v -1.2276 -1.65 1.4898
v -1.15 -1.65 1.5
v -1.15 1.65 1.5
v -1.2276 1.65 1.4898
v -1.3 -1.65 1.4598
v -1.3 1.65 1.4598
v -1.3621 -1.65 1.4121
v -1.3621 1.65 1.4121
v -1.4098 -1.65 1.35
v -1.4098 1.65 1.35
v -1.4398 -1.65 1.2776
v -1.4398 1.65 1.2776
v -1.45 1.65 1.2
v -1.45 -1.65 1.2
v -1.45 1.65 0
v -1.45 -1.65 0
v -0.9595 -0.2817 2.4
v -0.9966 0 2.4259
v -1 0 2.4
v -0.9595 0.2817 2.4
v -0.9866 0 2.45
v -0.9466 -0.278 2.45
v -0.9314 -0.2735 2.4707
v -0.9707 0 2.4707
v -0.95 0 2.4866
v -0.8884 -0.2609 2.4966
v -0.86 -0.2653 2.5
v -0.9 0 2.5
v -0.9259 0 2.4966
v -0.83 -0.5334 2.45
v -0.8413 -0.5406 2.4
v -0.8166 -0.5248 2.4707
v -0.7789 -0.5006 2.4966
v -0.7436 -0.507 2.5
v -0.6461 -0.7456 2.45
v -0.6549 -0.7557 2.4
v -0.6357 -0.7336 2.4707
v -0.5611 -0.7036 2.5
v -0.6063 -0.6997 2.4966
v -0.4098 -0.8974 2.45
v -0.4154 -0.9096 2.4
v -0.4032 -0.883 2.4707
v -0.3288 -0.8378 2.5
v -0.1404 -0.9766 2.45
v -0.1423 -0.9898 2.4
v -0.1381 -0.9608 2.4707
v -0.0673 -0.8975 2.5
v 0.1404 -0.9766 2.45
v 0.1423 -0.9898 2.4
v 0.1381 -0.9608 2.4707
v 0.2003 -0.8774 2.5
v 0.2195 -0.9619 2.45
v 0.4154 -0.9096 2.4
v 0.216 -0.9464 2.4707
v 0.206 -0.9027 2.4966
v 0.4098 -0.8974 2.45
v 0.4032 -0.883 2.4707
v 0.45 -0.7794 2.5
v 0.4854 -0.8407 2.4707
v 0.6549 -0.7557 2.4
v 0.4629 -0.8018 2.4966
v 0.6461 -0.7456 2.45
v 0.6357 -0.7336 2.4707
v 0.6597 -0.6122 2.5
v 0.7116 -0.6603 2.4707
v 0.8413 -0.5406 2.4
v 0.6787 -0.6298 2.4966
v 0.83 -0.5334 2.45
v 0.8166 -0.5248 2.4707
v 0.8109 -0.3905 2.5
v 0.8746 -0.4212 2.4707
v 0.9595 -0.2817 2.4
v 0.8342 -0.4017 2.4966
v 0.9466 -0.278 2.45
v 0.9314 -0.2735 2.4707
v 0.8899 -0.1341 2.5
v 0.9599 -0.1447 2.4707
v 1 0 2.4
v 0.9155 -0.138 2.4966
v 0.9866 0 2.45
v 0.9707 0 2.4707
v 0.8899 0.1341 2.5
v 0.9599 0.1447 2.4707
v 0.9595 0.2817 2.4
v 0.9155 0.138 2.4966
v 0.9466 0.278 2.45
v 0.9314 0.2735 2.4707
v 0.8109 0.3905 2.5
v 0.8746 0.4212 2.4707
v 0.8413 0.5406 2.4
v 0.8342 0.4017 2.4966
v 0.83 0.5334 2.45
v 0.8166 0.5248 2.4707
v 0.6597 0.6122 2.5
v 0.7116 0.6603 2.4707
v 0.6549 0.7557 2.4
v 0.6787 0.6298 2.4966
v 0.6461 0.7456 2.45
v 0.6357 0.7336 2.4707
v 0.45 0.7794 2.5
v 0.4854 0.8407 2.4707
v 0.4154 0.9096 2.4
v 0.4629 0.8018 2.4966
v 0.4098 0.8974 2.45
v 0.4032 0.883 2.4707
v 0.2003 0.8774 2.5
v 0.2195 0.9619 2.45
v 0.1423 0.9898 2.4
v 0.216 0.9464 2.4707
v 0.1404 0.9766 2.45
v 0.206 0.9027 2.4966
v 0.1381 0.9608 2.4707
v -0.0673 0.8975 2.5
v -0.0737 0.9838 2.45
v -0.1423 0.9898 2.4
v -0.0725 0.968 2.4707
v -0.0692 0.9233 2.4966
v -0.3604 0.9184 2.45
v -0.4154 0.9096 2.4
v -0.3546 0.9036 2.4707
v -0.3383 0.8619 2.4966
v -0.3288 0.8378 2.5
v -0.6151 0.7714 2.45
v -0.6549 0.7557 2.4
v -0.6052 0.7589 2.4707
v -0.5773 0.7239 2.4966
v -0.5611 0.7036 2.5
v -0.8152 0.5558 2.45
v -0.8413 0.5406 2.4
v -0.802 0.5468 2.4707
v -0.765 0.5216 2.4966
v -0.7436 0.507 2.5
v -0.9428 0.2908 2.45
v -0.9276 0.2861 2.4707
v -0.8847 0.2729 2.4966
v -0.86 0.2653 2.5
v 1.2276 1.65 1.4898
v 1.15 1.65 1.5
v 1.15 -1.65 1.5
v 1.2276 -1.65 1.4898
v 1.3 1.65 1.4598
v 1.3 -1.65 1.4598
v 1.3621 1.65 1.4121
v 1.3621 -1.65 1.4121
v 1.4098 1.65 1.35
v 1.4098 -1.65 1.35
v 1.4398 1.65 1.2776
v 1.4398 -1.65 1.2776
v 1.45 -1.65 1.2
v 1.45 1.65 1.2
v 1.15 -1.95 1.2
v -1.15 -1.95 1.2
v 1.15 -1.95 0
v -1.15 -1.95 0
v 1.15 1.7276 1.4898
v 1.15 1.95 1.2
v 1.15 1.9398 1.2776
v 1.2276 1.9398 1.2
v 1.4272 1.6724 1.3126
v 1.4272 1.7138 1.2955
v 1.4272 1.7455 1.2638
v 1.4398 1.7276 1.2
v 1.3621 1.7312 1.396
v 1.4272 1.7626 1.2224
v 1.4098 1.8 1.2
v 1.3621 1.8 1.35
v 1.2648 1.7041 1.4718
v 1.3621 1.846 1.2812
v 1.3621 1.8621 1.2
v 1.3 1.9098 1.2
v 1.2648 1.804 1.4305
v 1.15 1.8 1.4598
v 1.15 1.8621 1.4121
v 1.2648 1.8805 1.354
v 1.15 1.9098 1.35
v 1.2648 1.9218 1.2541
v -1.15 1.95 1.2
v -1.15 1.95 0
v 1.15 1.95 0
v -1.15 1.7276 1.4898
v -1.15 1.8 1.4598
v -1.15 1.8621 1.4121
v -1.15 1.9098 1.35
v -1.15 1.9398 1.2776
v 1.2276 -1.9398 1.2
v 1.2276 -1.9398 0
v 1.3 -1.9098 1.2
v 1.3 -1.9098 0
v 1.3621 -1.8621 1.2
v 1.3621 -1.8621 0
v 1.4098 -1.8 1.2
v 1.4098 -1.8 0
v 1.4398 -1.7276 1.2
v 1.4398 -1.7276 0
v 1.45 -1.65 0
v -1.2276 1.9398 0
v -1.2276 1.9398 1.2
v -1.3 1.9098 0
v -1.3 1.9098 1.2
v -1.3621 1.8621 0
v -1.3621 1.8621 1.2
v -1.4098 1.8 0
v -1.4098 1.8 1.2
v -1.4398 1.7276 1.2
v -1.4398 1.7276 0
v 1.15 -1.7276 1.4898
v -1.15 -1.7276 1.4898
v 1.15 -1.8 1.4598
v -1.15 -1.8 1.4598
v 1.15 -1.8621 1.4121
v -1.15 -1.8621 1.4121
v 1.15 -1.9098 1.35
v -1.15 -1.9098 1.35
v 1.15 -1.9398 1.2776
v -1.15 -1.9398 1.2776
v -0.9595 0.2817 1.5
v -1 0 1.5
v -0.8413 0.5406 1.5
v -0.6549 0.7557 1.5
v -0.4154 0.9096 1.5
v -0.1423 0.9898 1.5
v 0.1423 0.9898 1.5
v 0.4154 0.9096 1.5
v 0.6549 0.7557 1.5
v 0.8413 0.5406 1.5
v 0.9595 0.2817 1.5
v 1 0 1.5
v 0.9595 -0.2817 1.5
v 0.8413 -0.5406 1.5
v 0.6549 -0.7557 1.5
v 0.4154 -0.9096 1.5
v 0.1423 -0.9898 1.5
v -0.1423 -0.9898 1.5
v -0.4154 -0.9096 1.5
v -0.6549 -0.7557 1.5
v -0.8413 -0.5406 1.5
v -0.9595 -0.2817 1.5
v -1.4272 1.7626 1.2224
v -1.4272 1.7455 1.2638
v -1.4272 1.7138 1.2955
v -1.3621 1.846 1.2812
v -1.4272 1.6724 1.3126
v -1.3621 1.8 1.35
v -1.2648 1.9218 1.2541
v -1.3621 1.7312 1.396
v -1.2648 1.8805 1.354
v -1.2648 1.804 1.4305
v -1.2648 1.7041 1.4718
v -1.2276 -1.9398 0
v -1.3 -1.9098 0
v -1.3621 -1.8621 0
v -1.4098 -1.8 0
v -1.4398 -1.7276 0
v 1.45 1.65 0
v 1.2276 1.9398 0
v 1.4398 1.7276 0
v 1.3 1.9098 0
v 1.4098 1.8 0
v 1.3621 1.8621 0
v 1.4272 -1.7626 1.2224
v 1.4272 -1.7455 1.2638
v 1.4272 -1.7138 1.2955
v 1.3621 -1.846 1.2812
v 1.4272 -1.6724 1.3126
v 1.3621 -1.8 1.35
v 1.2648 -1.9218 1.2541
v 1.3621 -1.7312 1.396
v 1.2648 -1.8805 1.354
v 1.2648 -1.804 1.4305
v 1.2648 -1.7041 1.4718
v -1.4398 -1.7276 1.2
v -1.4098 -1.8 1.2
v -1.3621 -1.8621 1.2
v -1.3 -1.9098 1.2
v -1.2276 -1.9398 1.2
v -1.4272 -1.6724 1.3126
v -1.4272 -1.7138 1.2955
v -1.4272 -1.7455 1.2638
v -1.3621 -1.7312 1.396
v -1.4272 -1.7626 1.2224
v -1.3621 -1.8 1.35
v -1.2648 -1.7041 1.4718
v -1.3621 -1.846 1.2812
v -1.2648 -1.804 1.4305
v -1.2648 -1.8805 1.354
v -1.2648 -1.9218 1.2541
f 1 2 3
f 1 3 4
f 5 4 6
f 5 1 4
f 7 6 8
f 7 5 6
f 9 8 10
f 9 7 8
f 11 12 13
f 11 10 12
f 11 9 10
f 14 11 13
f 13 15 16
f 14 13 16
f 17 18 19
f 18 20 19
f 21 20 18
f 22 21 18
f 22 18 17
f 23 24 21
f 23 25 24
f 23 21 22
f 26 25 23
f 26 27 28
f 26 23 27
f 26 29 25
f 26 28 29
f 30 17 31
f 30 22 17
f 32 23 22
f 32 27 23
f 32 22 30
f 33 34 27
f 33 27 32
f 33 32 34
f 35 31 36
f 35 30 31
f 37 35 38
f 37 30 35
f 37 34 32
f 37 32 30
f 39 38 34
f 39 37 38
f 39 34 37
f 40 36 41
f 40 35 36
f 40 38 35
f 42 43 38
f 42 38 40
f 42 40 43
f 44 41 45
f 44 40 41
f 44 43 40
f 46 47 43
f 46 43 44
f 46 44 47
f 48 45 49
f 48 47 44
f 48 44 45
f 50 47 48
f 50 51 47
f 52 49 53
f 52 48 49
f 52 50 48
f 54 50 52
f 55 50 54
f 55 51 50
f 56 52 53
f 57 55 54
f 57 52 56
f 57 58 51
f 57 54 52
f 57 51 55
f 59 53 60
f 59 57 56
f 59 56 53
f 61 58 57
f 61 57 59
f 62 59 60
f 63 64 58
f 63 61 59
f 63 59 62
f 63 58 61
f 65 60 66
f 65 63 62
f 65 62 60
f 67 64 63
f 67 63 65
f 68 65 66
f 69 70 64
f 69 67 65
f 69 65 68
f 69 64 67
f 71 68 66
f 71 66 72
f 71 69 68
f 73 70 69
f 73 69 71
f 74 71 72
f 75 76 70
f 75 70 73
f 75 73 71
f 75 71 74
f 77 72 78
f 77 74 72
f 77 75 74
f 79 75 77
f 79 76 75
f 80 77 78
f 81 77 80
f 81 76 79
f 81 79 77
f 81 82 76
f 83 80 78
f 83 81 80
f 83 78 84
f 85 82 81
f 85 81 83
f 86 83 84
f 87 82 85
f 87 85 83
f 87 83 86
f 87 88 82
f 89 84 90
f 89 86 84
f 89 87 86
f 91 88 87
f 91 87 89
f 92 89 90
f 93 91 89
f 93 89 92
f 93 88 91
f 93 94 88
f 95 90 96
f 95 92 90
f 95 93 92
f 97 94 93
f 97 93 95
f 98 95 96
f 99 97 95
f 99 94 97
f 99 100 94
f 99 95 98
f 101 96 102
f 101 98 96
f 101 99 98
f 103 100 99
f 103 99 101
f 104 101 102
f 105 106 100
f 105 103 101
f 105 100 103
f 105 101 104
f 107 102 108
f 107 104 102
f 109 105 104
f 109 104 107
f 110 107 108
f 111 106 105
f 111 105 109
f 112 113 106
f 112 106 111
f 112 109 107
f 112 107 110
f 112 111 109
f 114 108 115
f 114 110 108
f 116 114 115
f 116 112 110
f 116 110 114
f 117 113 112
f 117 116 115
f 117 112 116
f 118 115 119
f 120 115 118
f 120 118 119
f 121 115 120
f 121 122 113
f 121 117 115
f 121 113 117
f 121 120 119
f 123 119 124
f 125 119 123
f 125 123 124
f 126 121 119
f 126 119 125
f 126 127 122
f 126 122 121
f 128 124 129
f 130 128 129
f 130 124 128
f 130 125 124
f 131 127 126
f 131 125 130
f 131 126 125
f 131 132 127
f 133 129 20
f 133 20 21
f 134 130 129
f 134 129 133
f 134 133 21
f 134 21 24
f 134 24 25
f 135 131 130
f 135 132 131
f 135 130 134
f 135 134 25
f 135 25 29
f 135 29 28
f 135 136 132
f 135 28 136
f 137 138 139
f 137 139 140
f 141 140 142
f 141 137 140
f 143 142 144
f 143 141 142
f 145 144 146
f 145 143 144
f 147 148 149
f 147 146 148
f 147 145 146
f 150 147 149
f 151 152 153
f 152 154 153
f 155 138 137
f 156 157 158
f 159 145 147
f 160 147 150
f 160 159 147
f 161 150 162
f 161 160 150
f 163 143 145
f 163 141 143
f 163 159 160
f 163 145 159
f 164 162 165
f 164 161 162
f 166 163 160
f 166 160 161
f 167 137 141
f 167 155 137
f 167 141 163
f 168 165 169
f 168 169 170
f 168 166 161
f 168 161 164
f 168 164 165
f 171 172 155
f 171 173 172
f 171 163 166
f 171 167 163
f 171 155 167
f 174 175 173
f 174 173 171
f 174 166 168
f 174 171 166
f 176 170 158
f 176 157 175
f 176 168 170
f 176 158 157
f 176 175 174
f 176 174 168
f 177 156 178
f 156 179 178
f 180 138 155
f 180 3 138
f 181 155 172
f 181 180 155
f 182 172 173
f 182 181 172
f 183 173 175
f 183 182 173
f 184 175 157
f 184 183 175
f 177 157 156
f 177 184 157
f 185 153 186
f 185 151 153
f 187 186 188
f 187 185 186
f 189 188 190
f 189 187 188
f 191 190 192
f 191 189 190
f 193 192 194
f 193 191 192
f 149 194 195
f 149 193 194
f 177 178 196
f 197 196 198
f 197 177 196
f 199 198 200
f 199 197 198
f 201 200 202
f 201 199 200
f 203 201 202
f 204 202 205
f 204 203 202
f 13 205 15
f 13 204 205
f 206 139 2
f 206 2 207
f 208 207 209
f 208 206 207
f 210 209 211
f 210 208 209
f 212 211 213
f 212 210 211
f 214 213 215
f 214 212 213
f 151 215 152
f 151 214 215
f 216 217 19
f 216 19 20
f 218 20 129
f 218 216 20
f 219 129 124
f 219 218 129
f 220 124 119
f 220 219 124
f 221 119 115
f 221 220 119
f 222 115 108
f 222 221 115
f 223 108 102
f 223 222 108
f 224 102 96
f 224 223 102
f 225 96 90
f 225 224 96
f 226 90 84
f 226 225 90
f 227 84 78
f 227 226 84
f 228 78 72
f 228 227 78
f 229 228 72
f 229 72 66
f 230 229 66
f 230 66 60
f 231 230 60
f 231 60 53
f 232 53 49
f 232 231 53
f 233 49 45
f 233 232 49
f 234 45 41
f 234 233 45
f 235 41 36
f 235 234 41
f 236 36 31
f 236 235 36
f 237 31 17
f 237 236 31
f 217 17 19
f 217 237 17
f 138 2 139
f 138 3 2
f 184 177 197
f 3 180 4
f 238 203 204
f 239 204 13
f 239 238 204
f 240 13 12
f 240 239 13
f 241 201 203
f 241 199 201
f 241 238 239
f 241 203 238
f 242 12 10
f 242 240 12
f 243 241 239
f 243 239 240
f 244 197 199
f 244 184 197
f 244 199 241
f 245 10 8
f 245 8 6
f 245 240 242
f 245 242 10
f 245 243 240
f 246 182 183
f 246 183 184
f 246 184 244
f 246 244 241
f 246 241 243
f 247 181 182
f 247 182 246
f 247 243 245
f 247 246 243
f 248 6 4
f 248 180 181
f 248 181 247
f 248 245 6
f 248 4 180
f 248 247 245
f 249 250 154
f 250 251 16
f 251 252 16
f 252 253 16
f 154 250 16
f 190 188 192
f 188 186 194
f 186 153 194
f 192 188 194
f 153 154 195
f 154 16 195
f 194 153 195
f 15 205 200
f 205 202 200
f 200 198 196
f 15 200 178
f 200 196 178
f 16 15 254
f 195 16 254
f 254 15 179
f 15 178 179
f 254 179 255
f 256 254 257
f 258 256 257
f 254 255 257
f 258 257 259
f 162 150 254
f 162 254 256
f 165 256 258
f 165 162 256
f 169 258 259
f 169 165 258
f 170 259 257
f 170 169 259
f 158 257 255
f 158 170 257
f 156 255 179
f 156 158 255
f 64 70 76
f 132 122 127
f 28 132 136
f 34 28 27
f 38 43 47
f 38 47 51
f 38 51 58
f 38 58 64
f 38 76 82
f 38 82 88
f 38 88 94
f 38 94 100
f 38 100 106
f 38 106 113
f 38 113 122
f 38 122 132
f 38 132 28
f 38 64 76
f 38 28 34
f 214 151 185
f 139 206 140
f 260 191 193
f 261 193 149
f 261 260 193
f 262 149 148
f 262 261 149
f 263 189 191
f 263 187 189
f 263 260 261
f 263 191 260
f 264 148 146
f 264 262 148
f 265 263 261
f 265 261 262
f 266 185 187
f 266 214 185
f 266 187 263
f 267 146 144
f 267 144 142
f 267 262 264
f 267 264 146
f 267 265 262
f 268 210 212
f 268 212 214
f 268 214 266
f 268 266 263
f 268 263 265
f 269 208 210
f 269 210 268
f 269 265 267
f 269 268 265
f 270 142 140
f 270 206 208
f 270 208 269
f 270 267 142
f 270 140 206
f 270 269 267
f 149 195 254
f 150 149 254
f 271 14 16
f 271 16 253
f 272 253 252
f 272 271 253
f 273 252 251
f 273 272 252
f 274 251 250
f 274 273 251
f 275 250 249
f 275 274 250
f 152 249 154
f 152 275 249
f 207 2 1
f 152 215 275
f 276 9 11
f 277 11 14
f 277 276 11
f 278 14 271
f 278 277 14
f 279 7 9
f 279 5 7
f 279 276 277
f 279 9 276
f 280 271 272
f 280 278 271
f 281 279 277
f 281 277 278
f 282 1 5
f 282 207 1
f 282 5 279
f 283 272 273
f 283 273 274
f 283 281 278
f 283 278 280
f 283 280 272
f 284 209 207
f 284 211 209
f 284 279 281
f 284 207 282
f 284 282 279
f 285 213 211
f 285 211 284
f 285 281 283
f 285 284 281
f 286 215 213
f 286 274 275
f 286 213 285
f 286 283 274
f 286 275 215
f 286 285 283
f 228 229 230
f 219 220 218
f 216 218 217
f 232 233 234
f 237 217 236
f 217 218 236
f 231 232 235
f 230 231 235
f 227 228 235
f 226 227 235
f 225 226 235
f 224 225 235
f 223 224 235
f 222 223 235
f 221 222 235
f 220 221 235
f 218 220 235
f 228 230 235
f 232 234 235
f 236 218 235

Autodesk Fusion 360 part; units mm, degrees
sketch "Sketch1" plane through (0, 0, 0) normal (0, 0, 1) x (1, 0, 0)
  line L0 (1.45, 1.95) -> (-1.45, 1.95)
  line L1 (-1.45, 1.95) -> (-1.45, -1.95)
  line L2 (-1.45, -1.95) -> (1.45, -1.95)
  line L3 (1.45, -1.95) -> (1.45, 1.95)
  line L4 (1.45, 1.95) -> (-1.45, -1.95) construction
  line L5 (-1.45, 1.95) -> (1.45, -1.95) construction
  dimension "d1" = 2.9
  dimension "d2" = 3.9
extrude "Extrude1" add sketch "Sketch1" along normal blind 1.5 makes body 1
fillet "Fillet1" radius 0.3 8 edges at (0, 1.95, 1.5) (0, -1.95, 1.5) (1.45, 0, 1.5) (-1.45, 0, 1.5) (1.45, -1.95, 0.75) (-1.45, -1.95, 0.75) (1.45, 1.95, 0.75) (-1.45, 1.95, 0.75) on bodies 1
sketch "Sketch2" plane through (0, 0, 1.5) normal (0, 0, 1) x (-1, 0, 0)
  line L0 (1.15, -1.65) -> (1.15, 1.65)
  line L1 (1.15, 1.65) -> (-1.15, 1.65)
  line L2 (-1.15, 1.65) -> (-1.15, -1.65)
  line L3 (-1.15, -1.65) -> (1.15, -1.65)
  circle A0 centre (0, 0) radius 1
  dimension "d7" = 2
extrude "Extrude2" add sketch "Sketch2" along normal blind 1 separate body contours A0 makes body 2
fillet "Fillet2" radius 0.1 1 edges at (0.9323, 0.3616, 2.5) on bodies 2
